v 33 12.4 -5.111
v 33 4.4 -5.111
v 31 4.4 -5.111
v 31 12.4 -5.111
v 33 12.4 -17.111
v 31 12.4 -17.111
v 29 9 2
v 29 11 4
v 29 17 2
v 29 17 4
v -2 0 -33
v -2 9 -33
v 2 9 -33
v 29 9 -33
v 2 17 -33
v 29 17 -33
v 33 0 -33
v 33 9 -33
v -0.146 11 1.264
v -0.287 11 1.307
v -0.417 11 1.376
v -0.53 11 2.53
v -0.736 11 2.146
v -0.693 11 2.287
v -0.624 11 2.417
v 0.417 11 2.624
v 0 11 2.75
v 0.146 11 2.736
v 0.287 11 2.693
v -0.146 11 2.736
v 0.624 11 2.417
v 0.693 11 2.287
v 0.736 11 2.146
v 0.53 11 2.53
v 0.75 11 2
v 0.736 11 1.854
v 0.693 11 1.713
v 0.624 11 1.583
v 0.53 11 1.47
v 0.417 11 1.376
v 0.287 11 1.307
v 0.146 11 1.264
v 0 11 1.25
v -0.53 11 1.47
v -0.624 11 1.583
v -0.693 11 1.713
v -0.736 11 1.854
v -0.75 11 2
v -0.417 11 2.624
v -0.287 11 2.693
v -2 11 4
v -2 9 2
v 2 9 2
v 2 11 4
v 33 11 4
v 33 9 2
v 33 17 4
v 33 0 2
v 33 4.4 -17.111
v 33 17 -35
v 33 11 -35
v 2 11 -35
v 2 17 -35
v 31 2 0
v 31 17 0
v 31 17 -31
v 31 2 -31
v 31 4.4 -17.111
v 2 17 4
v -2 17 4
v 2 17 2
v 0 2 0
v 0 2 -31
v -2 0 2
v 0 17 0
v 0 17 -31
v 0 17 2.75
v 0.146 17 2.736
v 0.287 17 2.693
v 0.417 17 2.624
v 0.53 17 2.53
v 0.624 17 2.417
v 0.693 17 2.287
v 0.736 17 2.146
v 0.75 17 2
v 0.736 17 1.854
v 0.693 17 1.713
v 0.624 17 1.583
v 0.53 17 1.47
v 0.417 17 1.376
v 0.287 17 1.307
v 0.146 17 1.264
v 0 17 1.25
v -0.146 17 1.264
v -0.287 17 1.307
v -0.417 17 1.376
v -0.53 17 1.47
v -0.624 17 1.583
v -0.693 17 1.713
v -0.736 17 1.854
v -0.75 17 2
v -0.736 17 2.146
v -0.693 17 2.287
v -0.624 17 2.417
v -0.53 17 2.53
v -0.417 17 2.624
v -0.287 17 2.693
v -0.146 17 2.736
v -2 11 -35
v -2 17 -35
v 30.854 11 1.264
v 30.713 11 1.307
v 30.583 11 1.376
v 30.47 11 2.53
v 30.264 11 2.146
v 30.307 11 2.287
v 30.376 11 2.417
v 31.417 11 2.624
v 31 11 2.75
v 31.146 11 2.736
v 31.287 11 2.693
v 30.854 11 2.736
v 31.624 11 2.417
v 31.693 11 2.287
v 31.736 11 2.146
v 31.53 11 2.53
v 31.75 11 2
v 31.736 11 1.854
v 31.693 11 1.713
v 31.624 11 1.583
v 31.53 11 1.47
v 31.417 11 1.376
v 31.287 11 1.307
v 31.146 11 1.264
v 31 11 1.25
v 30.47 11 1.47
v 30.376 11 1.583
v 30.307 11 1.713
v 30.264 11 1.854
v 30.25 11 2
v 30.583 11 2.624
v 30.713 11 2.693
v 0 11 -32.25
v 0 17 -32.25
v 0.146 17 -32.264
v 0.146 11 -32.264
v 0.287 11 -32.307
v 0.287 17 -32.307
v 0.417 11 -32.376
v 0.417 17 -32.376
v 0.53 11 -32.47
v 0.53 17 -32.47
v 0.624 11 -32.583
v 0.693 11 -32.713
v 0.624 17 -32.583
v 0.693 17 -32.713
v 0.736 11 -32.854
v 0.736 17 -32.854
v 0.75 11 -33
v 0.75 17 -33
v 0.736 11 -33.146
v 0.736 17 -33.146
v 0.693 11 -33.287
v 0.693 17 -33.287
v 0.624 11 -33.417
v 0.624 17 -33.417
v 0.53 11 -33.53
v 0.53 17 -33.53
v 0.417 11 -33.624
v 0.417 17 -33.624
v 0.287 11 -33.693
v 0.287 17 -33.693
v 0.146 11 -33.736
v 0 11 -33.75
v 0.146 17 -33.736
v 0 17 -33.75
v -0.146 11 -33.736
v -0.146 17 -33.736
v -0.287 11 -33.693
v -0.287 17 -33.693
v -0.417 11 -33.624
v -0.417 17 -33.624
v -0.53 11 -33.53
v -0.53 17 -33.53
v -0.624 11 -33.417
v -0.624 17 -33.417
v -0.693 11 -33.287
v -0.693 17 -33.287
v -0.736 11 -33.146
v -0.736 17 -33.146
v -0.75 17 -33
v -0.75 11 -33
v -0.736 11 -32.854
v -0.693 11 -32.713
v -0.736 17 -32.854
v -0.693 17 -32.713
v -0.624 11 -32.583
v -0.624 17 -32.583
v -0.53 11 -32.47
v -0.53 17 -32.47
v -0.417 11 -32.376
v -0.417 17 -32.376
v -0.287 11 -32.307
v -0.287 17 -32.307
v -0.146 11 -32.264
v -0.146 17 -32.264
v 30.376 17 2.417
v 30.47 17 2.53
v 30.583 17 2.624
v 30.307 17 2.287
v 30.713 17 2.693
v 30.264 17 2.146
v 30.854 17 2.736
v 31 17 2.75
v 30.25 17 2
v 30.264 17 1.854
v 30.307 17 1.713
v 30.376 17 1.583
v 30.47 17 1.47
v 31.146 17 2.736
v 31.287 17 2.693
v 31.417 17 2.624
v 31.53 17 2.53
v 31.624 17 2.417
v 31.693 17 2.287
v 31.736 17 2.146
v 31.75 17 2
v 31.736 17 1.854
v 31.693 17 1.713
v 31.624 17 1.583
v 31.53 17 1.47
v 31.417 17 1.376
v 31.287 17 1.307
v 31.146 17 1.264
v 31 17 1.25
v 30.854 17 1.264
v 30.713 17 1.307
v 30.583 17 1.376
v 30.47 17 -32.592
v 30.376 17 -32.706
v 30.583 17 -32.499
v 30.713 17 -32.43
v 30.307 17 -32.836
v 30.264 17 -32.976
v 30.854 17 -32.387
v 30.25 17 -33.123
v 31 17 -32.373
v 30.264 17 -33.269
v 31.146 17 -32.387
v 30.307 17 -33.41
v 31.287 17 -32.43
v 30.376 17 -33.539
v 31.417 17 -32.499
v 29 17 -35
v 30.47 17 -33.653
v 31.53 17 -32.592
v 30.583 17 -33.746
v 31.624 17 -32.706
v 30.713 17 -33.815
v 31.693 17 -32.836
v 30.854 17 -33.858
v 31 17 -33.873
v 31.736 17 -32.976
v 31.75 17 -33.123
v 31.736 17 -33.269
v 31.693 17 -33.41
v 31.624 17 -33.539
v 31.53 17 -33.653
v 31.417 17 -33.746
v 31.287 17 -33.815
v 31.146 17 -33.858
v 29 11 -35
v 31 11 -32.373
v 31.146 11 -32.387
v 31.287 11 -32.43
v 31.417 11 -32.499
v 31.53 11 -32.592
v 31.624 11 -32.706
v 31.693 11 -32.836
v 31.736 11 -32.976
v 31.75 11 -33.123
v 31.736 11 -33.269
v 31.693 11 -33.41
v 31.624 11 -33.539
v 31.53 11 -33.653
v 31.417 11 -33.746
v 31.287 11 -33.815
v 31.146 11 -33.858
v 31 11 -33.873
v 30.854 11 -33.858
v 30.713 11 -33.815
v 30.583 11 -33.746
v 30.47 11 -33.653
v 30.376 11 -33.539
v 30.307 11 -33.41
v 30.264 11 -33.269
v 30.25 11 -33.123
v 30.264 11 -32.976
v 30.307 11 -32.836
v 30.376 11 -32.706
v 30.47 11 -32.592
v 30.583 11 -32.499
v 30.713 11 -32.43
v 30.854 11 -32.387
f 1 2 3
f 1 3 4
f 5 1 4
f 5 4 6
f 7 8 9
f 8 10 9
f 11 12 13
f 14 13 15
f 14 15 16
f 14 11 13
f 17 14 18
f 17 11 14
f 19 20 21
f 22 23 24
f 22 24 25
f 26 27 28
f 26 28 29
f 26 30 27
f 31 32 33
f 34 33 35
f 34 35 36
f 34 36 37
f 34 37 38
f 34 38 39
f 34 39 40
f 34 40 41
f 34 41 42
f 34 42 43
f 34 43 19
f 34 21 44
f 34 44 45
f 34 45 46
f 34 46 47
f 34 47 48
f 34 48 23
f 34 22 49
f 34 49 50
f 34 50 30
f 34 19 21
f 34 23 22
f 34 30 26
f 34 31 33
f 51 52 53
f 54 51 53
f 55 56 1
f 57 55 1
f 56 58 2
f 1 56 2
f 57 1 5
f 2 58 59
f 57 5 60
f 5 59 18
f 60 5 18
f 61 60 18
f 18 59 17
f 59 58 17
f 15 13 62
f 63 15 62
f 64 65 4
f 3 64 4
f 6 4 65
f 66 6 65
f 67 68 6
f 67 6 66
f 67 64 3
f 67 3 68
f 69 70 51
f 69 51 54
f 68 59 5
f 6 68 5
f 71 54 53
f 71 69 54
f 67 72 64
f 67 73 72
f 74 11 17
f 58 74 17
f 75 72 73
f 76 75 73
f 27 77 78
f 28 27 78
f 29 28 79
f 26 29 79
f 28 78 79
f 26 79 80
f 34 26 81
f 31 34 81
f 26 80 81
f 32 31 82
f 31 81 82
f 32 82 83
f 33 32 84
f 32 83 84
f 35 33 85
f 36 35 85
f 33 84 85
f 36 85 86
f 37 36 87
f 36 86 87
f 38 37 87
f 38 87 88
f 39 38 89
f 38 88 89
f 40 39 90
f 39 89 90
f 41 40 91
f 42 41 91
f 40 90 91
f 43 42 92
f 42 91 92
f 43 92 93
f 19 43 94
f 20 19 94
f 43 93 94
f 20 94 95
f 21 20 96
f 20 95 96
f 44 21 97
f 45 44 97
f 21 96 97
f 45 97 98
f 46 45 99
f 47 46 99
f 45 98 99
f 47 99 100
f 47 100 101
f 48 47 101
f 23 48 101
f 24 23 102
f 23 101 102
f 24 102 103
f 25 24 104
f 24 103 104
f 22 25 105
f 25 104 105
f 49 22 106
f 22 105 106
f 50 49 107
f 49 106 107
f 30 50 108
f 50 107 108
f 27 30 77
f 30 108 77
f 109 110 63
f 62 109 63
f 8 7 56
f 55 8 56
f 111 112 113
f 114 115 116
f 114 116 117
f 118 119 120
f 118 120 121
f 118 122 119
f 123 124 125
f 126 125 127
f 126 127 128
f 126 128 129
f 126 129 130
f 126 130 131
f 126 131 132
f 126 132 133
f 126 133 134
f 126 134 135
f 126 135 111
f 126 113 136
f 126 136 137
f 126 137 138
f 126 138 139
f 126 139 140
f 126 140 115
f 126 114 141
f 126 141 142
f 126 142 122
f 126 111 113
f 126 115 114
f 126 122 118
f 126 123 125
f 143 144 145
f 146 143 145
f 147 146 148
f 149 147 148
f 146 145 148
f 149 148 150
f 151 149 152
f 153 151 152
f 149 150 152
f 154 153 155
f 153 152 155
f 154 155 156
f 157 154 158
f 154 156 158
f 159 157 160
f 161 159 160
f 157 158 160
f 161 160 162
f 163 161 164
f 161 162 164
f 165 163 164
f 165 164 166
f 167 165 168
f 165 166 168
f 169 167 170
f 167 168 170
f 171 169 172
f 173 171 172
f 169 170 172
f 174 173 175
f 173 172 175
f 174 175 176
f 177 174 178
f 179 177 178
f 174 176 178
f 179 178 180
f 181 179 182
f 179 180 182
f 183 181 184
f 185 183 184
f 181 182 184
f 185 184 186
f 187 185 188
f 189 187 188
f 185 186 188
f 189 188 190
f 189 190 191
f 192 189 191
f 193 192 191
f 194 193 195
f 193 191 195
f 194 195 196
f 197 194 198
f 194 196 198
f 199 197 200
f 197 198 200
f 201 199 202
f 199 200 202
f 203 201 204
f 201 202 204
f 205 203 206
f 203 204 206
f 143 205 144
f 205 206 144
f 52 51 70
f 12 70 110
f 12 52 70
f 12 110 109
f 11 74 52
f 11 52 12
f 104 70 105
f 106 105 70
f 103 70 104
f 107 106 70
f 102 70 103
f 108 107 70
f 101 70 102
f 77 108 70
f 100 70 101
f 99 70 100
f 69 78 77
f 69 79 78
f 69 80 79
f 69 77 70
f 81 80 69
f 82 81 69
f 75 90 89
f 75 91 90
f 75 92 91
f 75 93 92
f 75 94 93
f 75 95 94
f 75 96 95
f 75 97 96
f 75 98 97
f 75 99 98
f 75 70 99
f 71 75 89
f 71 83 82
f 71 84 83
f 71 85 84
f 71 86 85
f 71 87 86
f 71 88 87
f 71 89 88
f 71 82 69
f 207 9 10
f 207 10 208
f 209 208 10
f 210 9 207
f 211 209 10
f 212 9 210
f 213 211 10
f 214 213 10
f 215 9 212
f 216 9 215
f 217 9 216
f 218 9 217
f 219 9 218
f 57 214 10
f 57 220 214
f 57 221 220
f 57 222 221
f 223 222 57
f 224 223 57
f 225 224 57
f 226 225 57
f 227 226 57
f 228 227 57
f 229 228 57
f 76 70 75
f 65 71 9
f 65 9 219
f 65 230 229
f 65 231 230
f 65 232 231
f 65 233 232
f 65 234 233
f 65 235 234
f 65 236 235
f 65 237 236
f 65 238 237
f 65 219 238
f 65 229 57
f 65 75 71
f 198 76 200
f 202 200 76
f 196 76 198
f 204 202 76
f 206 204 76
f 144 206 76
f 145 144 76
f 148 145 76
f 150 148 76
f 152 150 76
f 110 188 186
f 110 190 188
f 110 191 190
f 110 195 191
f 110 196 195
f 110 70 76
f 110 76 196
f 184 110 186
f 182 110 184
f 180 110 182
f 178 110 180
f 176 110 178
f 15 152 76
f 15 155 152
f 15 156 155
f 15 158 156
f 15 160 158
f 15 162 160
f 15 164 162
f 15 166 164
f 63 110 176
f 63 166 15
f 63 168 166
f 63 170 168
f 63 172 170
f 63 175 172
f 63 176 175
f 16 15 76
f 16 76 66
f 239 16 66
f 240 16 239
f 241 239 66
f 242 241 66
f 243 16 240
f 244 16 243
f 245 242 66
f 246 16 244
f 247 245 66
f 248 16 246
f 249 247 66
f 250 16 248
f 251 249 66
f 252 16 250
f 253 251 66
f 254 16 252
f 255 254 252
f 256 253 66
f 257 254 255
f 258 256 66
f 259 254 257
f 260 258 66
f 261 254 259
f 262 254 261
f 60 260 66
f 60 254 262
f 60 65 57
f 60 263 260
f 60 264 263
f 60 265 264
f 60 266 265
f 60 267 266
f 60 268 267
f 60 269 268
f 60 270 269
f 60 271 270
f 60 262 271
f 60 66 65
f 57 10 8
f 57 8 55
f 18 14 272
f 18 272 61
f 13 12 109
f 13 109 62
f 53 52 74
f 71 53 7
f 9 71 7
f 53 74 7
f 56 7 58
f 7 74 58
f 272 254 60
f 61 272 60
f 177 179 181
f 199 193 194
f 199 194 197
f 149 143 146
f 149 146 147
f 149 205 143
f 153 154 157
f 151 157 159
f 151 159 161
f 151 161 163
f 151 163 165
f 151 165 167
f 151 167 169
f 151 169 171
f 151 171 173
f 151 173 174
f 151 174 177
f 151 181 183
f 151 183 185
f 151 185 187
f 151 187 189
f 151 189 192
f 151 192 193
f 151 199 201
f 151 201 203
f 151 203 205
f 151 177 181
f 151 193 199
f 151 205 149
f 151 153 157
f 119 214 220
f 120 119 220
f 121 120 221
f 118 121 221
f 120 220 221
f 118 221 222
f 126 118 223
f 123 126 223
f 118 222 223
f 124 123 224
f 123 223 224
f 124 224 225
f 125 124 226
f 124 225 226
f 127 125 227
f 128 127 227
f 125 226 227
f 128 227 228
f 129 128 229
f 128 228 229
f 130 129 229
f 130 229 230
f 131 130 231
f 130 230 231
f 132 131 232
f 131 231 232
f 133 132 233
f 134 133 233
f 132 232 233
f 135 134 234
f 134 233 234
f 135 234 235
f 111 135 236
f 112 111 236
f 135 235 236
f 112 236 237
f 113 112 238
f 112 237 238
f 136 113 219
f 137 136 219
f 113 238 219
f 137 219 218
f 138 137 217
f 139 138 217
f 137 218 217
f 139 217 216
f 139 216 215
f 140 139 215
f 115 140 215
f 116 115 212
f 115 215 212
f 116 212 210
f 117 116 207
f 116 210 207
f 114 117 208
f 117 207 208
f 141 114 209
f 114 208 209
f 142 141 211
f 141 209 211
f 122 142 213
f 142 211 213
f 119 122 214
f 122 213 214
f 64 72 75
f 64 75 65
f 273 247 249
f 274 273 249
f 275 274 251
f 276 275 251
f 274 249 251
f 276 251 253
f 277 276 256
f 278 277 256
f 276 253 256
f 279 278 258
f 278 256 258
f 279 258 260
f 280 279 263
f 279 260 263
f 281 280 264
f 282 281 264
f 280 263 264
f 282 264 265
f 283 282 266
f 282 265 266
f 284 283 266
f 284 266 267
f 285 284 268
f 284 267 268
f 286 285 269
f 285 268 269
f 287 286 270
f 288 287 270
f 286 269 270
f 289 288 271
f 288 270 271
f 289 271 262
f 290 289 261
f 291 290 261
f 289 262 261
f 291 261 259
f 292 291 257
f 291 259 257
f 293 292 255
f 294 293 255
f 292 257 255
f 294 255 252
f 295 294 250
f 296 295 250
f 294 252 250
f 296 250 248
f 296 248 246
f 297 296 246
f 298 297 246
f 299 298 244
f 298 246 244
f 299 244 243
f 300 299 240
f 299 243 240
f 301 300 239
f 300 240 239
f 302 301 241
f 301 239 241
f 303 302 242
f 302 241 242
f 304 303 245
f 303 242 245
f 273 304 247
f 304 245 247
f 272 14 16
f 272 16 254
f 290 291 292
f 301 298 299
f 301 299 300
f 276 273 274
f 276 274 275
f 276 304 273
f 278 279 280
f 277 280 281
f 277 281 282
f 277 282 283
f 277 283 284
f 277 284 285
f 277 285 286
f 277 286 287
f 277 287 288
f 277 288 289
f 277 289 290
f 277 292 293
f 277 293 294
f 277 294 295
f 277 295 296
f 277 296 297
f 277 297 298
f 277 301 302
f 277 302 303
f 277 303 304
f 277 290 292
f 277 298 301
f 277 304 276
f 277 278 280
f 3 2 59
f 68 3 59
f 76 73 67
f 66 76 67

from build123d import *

# Parameters (mm, degrees)
SKETCH1_W           = 35
SKETCH1_H           = 35
SKETCH1_W_2         = 31
SKETCH1_H_2         = 31
BOSS_EXTRUDE1_DEPTH = 2
SKETCH1_3_W         = 35
SKETCH1_3_H         = 35
SKETCH1_3_W_2       = 31
SKETCH1_3_H_2       = 31
BOSS_EXTRUDE2_DEPTH = 17
SKETCH2_W           = 12
SKETCH2_H           = 8
CUT_EXTRUDE1_DEPTH  = 15
SKETCH3_W           = 4
SKETCH3_H           = 2
BOSS_EXTRUDE3_DEPTH = 6
CHAMFER1_SIZE       = 2
SKETCH4_R           = 0.75
CUT_EXTRUDE2_DEPTH  = 6


with BuildPart() as part:
    # Sketch1 → Boss-Extrude1 (new body)
    # profile 1 of 2: a face of its own
    with BuildSketch(Plane(origin=(0, 0, 0), x_dir=(1, 0, 0), z_dir=(0, 1, 0))):
        with Locations((15.5, 15.5)):
            Rectangle(SKETCH1_W, SKETCH1_H)
        with Locations((15.5, 15.5)):
            Rectangle(SKETCH1_W_2, SKETCH1_H_2, mode=Mode.SUBTRACT)
    # profile 2 of 2: a face of its own
    with BuildSketch(Plane(origin=(0, 0, 0), x_dir=(1, 0, 0), z_dir=(0, 1, 0))):
        with Locations((15.5, 15.5)):
            Rectangle(SKETCH1_W_2, SKETCH1_H_2)
    extrude(amount=BOSS_EXTRUDE1_DEPTH)

    # Sketch1<3> → Boss-Extrude2 (add)
    with BuildSketch(Plane(origin=(0, 0, 0), x_dir=(1, 0, 0), z_dir=(0, 1, 0))):
        with Locations((15.5, 15.5)):
            Rectangle(SKETCH1_3_W, SKETCH1_3_H)
        with Locations((15.5, 15.5)):
            Rectangle(SKETCH1_3_W_2, SKETCH1_3_H_2, mode=Mode.SUBTRACT)
    extrude(amount=BOSS_EXTRUDE2_DEPTH)

    # Sketch2 → Cut-Extrude1 (cut)
    with BuildSketch(Plane(origin=(33, 0, 0), x_dir=(0, 0, -1), z_dir=(1, 0, 0))):
        with Locations((11.111303283, 8.4)):
            Rectangle(SKETCH2_W, SKETCH2_H)
    extrude(amount=-CUT_EXTRUDE1_DEPTH, mode=Mode.SUBTRACT)

    # Sketch3 → Boss-Extrude3 (add)
    with BuildSketch(Plane(origin=(0, 17, 0), x_dir=(1, 0, 0), z_dir=(0, 1, 0))):
        with Locations((31, 34)):
            Rectangle(SKETCH3_W, SKETCH3_H)
        with Locations((0, 34)):
            Rectangle(SKETCH3_W, SKETCH3_H)
        with Locations((0, -3)):
            Rectangle(SKETCH3_W, SKETCH3_H)
        with Locations((31, -3)):
            Rectangle(SKETCH3_W, SKETCH3_H)
    extrude(amount=-BOSS_EXTRUDE3_DEPTH)

    # Chamfer1
    chamfer1_edges = [part.edges().sort_by_distance(p)[0] for p in [
        (31, 11, 2),
        (0, 11, 2),
        (0, 11, -33),
        (31, 11, -33),
    ]]
    chamfer(chamfer1_edges, length=CHAMFER1_SIZE - 0.0001)  # a hair under: the kernel refuses the full size

    # Sketch4 → Cut-Extrude2 (cut)
    with BuildSketch(Plane(origin=(0, 17, 0), x_dir=(1, 0, 0), z_dir=(0, 1, 0))):
        with Locations(Location((31, 33.122538924, 0), (0, 0, 270))):
            Circle(SKETCH4_R)
        with Locations(Location((31, -2, 0), (0, 0, 270))):
            Circle(SKETCH4_R)
        with Locations(Location((0, -2, 0), (0, 0, 270))):
            Circle(SKETCH4_R)
        with Locations(Location((0, 33, 0), (0, 0, 270))):
            Circle(SKETCH4_R)
    extrude(amount=-CUT_EXTRUDE2_DEPTH, mode=Mode.SUBTRACT)


solid = part.part
